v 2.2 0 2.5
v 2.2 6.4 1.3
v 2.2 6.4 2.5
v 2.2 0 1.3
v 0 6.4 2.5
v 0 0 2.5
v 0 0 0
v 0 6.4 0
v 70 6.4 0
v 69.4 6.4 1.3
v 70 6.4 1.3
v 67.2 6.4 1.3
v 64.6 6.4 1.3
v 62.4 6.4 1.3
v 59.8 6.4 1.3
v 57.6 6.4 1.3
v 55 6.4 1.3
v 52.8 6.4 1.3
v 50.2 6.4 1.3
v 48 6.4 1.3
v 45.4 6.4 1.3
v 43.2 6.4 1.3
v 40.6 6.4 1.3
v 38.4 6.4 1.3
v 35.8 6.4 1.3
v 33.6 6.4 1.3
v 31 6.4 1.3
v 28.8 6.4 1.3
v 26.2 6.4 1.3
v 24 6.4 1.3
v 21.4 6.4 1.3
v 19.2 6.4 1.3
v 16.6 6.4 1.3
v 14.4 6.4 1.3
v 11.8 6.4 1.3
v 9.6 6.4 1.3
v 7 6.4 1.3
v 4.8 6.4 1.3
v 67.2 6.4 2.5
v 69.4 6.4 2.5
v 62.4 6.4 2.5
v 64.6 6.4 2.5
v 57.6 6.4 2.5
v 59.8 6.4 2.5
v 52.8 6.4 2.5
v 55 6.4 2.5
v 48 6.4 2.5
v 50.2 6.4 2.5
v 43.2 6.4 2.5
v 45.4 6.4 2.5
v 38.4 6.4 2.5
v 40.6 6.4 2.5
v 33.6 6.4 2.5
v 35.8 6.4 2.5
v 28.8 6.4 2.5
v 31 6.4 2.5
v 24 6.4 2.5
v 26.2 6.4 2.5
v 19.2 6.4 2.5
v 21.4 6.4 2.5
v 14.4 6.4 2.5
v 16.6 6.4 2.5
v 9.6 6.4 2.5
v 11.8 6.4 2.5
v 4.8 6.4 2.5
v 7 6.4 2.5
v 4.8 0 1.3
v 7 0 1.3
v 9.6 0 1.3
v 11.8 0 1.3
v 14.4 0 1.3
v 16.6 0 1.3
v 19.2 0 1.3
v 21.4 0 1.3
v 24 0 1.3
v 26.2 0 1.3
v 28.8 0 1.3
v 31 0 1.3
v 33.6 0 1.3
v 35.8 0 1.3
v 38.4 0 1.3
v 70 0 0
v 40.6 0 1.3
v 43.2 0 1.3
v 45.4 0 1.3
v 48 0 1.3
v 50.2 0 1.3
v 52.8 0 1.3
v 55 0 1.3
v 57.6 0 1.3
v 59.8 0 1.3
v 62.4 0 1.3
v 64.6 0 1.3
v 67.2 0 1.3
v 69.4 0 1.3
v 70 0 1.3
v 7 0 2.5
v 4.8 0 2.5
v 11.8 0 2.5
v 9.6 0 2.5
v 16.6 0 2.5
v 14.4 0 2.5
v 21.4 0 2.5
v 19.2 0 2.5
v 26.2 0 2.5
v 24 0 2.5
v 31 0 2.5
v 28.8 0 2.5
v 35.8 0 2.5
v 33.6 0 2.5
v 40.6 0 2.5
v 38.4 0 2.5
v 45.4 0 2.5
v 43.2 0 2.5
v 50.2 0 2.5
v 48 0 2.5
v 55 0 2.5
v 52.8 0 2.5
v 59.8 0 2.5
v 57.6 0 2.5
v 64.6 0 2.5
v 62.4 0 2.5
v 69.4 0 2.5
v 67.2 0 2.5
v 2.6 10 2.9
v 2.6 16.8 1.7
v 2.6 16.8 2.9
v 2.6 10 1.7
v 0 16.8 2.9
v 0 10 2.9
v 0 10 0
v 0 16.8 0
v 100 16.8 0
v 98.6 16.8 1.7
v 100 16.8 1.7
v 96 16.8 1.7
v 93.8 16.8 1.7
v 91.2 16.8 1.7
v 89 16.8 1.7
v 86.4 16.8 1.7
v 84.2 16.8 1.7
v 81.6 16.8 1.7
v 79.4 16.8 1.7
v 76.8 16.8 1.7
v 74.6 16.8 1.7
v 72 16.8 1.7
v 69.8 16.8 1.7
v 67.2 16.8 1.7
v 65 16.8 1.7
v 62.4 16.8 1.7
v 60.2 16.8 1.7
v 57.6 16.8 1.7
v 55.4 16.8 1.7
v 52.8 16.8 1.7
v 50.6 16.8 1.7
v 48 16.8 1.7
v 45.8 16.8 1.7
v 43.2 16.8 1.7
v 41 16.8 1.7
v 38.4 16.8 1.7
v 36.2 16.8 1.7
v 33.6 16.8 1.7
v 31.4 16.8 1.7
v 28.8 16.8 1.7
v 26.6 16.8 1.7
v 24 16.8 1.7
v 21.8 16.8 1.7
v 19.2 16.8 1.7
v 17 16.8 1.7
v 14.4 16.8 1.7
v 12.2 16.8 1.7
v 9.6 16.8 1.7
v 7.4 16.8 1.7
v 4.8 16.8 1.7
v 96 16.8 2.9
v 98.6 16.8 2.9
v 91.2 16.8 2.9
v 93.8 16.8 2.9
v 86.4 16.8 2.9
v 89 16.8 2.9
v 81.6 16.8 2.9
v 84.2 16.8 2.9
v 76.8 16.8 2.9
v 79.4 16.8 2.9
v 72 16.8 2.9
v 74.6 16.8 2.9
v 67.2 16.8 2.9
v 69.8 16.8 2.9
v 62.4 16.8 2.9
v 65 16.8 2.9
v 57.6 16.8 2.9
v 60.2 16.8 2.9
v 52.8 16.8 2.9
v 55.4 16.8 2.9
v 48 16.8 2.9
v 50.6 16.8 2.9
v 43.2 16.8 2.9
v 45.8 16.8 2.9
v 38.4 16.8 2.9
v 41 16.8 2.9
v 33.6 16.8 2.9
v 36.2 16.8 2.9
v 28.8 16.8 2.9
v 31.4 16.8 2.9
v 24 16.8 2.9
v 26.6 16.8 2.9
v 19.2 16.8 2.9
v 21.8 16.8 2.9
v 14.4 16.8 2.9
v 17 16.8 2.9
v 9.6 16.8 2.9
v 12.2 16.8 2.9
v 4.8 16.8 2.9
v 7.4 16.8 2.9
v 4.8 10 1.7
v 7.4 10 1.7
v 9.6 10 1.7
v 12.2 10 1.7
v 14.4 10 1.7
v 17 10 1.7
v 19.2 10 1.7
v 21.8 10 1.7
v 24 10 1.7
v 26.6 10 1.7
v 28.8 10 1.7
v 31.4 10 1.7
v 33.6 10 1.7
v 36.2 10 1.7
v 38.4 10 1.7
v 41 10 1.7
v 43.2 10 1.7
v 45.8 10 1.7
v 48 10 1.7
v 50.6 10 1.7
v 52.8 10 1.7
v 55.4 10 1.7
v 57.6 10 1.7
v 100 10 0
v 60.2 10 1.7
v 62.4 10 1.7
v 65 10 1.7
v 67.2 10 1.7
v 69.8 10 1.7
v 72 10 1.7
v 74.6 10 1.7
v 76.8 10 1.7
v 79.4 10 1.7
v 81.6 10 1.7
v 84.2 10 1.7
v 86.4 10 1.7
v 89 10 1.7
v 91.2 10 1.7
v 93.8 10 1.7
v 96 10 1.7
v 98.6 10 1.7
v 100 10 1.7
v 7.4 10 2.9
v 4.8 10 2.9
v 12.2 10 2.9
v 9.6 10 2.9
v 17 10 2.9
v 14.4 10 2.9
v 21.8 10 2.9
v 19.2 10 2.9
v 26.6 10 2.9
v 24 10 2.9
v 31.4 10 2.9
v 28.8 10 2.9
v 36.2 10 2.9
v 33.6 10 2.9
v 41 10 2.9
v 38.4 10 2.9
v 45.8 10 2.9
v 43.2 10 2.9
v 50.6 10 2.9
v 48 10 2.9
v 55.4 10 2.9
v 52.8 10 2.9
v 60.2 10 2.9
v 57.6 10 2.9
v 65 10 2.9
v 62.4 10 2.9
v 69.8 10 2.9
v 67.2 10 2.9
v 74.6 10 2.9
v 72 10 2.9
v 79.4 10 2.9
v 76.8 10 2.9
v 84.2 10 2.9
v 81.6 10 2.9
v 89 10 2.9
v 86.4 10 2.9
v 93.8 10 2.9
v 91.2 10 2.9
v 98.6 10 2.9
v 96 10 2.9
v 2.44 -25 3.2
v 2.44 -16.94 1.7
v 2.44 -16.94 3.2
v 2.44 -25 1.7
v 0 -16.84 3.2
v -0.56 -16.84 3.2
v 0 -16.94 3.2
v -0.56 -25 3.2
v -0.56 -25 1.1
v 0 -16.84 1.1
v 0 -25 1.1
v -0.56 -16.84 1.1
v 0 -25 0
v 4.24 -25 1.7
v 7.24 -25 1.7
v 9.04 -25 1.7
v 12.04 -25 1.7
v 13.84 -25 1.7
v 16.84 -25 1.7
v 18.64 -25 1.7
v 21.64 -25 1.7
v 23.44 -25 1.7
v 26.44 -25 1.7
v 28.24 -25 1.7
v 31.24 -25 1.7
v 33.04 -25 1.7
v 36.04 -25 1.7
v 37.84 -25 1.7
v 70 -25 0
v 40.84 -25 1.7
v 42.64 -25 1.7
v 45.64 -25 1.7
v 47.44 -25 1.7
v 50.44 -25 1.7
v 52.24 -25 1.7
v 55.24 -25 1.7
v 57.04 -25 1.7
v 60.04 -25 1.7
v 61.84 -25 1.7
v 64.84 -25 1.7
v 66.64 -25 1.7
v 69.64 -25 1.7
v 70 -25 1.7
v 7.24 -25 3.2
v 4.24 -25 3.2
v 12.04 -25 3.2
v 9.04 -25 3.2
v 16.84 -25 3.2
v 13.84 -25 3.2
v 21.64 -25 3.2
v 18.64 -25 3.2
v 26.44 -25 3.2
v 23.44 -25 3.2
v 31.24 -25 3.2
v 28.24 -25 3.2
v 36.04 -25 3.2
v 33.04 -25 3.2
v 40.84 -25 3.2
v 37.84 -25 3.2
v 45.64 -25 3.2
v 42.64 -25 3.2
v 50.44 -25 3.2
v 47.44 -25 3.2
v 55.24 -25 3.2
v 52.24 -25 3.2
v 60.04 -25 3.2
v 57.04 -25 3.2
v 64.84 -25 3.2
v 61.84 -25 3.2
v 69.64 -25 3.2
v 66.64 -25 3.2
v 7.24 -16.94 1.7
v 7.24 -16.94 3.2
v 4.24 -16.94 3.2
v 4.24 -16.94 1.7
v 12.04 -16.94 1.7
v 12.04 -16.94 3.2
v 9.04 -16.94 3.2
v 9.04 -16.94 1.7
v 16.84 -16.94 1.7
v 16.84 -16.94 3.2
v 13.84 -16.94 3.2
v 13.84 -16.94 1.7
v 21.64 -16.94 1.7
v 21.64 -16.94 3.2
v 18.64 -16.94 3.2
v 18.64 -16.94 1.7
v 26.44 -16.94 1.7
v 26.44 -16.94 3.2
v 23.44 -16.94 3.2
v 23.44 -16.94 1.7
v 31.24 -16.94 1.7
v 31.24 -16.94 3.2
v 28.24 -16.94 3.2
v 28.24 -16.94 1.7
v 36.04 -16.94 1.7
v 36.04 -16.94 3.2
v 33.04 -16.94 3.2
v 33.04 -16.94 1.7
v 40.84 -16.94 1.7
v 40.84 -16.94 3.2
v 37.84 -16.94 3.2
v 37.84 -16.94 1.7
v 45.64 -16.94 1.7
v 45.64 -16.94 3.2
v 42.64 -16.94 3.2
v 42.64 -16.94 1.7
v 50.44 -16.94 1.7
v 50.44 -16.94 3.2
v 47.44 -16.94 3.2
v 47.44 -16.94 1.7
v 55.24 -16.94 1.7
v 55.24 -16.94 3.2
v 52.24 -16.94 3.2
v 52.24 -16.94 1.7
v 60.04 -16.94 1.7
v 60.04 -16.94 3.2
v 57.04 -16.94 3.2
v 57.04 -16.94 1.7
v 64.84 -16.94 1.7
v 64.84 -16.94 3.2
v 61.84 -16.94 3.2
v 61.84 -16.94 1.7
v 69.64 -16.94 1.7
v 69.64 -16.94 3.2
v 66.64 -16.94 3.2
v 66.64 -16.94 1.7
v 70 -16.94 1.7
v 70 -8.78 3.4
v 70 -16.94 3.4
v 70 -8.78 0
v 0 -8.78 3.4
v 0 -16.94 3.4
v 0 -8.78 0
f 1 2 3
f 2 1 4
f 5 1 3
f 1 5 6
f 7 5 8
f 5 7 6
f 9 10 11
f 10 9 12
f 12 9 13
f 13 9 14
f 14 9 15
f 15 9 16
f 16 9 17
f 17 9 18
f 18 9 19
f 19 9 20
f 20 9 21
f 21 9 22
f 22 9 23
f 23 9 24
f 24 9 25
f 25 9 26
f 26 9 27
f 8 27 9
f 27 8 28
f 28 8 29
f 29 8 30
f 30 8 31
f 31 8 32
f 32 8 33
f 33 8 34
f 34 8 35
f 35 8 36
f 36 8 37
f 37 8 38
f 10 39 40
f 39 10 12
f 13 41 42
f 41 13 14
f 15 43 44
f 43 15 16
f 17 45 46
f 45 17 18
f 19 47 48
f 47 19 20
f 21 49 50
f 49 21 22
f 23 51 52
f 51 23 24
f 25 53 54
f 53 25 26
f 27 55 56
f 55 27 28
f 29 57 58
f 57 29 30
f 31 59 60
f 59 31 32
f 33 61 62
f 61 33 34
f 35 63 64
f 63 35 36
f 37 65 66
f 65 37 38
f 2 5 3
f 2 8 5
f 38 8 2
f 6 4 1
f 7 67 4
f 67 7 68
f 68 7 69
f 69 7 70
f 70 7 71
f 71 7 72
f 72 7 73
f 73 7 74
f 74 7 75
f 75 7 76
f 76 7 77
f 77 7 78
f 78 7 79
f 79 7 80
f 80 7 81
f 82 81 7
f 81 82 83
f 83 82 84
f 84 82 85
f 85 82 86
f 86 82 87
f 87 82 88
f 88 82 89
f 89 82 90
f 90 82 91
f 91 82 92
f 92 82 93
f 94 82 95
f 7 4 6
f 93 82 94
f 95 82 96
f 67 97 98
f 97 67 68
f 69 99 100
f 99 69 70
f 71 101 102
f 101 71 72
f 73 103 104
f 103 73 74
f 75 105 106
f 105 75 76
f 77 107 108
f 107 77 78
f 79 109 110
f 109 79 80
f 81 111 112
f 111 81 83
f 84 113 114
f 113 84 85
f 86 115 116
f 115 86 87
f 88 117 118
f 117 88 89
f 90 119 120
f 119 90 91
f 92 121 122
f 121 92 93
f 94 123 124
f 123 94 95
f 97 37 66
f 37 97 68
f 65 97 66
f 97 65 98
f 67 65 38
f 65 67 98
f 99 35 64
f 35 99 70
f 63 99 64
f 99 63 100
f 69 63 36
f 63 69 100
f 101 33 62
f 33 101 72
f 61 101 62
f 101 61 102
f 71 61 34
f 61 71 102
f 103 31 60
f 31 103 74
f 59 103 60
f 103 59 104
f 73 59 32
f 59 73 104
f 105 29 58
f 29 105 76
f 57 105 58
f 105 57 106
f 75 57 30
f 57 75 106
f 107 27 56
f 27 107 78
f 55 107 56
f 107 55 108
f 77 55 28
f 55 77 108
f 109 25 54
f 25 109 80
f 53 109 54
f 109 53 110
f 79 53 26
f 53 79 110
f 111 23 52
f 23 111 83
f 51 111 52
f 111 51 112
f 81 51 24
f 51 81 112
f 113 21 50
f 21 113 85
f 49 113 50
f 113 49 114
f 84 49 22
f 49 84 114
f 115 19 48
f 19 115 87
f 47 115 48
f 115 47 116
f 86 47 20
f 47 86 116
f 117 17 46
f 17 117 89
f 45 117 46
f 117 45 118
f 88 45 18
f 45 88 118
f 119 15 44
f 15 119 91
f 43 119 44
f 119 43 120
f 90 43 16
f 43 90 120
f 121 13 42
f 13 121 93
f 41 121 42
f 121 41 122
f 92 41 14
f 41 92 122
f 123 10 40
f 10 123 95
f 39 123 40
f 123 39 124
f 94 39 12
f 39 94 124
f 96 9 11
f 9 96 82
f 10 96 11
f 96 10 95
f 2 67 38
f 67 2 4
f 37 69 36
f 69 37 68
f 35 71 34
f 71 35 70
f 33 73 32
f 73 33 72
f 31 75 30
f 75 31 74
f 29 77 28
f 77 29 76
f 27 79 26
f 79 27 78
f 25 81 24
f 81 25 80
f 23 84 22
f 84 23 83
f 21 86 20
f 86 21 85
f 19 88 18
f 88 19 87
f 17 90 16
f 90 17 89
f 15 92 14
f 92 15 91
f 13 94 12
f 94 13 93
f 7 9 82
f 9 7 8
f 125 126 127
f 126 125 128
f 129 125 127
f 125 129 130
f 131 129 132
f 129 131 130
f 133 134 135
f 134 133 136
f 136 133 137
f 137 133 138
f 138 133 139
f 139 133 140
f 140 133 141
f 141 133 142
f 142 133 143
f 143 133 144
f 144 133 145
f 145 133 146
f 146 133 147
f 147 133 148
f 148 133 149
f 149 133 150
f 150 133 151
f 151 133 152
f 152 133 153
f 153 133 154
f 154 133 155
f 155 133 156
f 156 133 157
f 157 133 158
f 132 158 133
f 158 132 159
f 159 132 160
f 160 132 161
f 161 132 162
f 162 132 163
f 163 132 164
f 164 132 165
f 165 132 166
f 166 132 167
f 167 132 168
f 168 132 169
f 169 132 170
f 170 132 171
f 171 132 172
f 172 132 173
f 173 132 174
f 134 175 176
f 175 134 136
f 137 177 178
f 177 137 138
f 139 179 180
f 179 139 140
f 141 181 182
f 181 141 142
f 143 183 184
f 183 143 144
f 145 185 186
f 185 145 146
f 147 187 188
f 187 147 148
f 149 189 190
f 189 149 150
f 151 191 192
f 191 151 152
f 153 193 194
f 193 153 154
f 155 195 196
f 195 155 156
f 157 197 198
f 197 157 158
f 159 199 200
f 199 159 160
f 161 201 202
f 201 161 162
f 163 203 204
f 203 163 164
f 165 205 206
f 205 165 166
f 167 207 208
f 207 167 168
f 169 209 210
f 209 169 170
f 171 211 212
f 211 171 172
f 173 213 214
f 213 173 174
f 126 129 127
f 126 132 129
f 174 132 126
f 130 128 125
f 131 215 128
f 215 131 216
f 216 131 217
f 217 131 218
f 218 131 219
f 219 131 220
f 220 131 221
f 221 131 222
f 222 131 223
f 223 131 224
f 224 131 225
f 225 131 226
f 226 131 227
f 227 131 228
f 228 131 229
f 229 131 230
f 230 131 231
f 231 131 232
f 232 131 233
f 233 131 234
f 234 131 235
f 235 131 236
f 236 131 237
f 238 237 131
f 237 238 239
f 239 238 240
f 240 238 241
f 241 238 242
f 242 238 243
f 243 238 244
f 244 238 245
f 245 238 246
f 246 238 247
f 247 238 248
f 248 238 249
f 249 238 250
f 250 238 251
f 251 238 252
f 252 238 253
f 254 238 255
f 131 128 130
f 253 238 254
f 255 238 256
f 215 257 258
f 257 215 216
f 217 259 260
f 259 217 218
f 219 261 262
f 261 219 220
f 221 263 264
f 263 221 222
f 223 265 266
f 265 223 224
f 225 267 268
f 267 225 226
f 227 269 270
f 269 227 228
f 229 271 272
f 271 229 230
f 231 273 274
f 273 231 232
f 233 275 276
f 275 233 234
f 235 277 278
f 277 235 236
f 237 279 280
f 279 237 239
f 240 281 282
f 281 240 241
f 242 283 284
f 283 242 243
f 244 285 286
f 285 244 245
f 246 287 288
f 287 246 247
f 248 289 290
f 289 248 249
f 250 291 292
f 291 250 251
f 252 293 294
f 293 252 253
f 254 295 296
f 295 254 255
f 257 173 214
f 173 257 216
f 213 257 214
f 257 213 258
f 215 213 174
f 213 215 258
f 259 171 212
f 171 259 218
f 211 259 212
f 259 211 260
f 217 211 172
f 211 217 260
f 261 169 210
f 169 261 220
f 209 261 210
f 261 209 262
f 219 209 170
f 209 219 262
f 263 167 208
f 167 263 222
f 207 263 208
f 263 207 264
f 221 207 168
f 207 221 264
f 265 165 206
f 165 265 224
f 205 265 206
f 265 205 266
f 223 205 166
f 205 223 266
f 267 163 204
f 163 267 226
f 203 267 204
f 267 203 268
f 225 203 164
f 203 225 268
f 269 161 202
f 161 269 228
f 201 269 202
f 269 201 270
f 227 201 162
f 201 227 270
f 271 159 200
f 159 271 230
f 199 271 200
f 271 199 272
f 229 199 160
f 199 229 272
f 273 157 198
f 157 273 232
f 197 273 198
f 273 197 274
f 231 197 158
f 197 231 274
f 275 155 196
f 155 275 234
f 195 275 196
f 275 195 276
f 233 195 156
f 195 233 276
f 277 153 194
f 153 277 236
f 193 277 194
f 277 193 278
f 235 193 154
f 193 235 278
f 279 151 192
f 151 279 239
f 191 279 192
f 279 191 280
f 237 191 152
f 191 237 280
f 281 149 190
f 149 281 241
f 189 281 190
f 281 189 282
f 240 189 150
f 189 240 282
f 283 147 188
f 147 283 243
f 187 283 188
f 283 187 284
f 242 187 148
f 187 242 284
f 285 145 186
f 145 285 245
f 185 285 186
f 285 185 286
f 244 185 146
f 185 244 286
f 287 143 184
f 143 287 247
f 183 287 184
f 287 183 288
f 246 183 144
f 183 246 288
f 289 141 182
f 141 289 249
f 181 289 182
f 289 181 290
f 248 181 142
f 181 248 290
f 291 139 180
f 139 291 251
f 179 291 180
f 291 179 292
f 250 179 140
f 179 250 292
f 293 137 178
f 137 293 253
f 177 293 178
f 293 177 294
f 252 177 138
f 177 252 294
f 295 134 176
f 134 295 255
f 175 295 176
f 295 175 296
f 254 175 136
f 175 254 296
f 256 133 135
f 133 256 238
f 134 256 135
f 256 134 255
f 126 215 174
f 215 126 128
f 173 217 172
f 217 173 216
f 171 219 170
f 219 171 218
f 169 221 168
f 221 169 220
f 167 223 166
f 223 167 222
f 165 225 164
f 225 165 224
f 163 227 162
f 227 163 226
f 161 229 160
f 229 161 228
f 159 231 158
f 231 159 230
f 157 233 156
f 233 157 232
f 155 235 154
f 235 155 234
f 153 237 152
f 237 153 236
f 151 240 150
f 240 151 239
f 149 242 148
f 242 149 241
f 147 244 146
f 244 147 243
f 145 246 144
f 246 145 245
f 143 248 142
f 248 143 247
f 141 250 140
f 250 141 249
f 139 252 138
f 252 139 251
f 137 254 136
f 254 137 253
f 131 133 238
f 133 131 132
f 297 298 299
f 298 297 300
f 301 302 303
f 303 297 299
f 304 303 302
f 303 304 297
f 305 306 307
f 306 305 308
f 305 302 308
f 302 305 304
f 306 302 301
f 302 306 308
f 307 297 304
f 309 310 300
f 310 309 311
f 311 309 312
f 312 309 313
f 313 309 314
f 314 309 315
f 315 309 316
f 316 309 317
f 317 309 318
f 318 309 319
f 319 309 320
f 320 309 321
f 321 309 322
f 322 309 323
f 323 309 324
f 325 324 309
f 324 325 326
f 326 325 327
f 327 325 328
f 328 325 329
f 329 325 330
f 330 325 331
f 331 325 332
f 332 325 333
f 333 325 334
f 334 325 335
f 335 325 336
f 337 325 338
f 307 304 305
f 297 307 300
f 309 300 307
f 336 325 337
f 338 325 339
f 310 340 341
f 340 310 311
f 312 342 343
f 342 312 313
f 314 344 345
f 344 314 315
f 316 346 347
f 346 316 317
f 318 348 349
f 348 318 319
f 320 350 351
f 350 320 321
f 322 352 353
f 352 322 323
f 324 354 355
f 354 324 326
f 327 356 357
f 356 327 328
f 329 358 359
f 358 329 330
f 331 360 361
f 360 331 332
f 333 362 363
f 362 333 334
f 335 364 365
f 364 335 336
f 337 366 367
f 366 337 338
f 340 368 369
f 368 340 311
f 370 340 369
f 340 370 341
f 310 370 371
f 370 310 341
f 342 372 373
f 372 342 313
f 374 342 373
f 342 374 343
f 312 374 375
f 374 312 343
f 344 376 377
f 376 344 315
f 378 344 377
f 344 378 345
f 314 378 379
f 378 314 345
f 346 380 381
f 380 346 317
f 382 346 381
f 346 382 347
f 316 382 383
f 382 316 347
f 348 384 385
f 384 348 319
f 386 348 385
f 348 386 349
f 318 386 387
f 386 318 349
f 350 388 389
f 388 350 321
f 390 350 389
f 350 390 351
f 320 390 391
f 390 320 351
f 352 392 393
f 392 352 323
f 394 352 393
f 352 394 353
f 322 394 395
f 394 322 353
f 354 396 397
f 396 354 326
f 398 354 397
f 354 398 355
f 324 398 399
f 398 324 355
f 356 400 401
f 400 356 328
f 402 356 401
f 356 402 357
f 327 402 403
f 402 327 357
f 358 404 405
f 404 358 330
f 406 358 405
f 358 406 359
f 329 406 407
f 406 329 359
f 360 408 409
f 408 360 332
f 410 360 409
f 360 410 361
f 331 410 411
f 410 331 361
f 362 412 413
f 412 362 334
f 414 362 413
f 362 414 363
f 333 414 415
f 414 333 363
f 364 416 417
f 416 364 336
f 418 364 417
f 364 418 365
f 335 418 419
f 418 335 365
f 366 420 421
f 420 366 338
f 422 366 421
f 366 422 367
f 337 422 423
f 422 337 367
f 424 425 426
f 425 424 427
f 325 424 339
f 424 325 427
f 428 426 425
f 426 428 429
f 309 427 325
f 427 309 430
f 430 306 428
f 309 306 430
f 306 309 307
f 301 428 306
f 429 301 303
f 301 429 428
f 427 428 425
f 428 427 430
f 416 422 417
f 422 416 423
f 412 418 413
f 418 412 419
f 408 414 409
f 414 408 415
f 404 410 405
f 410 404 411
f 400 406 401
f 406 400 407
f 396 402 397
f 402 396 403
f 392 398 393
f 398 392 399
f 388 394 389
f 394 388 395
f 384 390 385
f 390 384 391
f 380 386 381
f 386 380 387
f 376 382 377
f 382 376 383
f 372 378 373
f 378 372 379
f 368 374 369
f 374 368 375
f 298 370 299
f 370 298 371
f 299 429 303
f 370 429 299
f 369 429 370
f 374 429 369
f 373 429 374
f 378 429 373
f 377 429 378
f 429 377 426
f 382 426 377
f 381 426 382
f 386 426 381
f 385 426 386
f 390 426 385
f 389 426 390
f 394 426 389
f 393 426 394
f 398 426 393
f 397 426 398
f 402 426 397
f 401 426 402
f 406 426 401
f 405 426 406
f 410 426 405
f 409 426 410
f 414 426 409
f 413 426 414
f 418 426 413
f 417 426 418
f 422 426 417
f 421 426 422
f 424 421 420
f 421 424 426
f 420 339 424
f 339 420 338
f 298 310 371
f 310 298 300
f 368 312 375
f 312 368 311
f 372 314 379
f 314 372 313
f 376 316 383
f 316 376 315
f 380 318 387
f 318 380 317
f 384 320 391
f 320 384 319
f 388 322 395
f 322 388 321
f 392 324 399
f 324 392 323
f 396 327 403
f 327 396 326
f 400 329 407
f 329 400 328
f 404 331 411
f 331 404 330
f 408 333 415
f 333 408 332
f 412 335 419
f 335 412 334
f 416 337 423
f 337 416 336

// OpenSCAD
function 2XLBeltBaseHeight(3dPrinterTolerance=.4)= 1.3 + 3dPrinterTolerance;
function 2XLBeltGripHeight(3dPrinterTolerance=.4)= 2.5 + .5 + 3dPrinterTolerance;
function 2XLBeltToothWidth(3dPrinterTolerance=.4)= 2.2 + 3dPrinterTolerance;
function 2XLBeltSpaceWidth(3dPrinterTolerance=0)= 2.6 + 3dPrinterTolerance;
function 2XLBeltWidth(3dPrinterTolerance=.4)= 6.4 + 3dPrinterTolerance;
function 2XLBeltPitch()= 5.08;
function 2XLBeltSlotWidth(3dPrinterTolerance=.4)=2XLBeltWidth(3dPrinterTolerance)*1.2;


function 2XLBeltAvgHeight(3dPrinterTolerance=.4)=(2XLBeltBaseHeight()+2XLBeltGripHeight()*2)/3;


module 2XLTimingBelt(3dPrinterTolerance=.4, Length=70,) {
	cube([Length,2XLBeltWidth(3dPrinterTolerance),2XLBeltBaseHeight(3dPrinterTolerance)]) ;
	for (inc = [0:(2XLBeltToothWidth(3dPrinterTolerance)
+2XLBeltSpaceWidth(0)-3dPrinterTolerance):Length-2XLBeltToothWidth(3dPrinterTolerance)]) translate([inc,0,2XLBeltBaseHeight(3dPrinterTolerance)-.5]) #cube([2XLBeltToothWidth(3dPrinterTolerance)
,2XLBeltWidth(3dPrinterTolerance),(2XLBeltGripHeight(3dPrinterTolerance)-2XLBeltBaseHeight(3dPrinterTolerance))]) ;
}

color("blue")
2XLTimingBelt(0);

translate([0,10,0])
color("red")
2XLTimingBelt(.4, 100);

module 2XLTimingBeltSlot(3dPrinterTolerance=.4, Length=70)
union()
{
	translate([0,2XLBeltSlotWidth(3dPrinterTolerance)-.1,0])
	{
		cube([Length,2XLBeltSlotWidth(3dPrinterTolerance),2XLBeltGripHeight()]);
	}
	 
	cube([Length,2XLBeltSlotWidth(3dPrinterTolerance),2XLBeltBaseHeight(3dPrinterTolerance)]) ;
	for (inc = [	0:	
	            	(2XLBeltToothWidth(3dPrinterTolerance)+2XLBeltSpaceWidth(0)-3dPrinterTolerance):
	            	Length-2XLBeltToothWidth(3dPrinterTolerance)]){
		translate([	inc-3dPrinterTolerance*1.4,
		           	0,
		           	2XLBeltBaseHeight(3dPrinterTolerance)-.6]) 
		           		cube([	2XLBeltToothWidth(3dPrinterTolerance*2),
		           		      	2XLBeltSlotWidth(3dPrinterTolerance),
		           		      	(2XLBeltGripHeight(3dPrinterTolerance*2)-2XLBeltBaseHeight(3dPrinterTolerance))]) ;
	}

}

translate([0,-25,0])
2XLTimingBeltSlot();
